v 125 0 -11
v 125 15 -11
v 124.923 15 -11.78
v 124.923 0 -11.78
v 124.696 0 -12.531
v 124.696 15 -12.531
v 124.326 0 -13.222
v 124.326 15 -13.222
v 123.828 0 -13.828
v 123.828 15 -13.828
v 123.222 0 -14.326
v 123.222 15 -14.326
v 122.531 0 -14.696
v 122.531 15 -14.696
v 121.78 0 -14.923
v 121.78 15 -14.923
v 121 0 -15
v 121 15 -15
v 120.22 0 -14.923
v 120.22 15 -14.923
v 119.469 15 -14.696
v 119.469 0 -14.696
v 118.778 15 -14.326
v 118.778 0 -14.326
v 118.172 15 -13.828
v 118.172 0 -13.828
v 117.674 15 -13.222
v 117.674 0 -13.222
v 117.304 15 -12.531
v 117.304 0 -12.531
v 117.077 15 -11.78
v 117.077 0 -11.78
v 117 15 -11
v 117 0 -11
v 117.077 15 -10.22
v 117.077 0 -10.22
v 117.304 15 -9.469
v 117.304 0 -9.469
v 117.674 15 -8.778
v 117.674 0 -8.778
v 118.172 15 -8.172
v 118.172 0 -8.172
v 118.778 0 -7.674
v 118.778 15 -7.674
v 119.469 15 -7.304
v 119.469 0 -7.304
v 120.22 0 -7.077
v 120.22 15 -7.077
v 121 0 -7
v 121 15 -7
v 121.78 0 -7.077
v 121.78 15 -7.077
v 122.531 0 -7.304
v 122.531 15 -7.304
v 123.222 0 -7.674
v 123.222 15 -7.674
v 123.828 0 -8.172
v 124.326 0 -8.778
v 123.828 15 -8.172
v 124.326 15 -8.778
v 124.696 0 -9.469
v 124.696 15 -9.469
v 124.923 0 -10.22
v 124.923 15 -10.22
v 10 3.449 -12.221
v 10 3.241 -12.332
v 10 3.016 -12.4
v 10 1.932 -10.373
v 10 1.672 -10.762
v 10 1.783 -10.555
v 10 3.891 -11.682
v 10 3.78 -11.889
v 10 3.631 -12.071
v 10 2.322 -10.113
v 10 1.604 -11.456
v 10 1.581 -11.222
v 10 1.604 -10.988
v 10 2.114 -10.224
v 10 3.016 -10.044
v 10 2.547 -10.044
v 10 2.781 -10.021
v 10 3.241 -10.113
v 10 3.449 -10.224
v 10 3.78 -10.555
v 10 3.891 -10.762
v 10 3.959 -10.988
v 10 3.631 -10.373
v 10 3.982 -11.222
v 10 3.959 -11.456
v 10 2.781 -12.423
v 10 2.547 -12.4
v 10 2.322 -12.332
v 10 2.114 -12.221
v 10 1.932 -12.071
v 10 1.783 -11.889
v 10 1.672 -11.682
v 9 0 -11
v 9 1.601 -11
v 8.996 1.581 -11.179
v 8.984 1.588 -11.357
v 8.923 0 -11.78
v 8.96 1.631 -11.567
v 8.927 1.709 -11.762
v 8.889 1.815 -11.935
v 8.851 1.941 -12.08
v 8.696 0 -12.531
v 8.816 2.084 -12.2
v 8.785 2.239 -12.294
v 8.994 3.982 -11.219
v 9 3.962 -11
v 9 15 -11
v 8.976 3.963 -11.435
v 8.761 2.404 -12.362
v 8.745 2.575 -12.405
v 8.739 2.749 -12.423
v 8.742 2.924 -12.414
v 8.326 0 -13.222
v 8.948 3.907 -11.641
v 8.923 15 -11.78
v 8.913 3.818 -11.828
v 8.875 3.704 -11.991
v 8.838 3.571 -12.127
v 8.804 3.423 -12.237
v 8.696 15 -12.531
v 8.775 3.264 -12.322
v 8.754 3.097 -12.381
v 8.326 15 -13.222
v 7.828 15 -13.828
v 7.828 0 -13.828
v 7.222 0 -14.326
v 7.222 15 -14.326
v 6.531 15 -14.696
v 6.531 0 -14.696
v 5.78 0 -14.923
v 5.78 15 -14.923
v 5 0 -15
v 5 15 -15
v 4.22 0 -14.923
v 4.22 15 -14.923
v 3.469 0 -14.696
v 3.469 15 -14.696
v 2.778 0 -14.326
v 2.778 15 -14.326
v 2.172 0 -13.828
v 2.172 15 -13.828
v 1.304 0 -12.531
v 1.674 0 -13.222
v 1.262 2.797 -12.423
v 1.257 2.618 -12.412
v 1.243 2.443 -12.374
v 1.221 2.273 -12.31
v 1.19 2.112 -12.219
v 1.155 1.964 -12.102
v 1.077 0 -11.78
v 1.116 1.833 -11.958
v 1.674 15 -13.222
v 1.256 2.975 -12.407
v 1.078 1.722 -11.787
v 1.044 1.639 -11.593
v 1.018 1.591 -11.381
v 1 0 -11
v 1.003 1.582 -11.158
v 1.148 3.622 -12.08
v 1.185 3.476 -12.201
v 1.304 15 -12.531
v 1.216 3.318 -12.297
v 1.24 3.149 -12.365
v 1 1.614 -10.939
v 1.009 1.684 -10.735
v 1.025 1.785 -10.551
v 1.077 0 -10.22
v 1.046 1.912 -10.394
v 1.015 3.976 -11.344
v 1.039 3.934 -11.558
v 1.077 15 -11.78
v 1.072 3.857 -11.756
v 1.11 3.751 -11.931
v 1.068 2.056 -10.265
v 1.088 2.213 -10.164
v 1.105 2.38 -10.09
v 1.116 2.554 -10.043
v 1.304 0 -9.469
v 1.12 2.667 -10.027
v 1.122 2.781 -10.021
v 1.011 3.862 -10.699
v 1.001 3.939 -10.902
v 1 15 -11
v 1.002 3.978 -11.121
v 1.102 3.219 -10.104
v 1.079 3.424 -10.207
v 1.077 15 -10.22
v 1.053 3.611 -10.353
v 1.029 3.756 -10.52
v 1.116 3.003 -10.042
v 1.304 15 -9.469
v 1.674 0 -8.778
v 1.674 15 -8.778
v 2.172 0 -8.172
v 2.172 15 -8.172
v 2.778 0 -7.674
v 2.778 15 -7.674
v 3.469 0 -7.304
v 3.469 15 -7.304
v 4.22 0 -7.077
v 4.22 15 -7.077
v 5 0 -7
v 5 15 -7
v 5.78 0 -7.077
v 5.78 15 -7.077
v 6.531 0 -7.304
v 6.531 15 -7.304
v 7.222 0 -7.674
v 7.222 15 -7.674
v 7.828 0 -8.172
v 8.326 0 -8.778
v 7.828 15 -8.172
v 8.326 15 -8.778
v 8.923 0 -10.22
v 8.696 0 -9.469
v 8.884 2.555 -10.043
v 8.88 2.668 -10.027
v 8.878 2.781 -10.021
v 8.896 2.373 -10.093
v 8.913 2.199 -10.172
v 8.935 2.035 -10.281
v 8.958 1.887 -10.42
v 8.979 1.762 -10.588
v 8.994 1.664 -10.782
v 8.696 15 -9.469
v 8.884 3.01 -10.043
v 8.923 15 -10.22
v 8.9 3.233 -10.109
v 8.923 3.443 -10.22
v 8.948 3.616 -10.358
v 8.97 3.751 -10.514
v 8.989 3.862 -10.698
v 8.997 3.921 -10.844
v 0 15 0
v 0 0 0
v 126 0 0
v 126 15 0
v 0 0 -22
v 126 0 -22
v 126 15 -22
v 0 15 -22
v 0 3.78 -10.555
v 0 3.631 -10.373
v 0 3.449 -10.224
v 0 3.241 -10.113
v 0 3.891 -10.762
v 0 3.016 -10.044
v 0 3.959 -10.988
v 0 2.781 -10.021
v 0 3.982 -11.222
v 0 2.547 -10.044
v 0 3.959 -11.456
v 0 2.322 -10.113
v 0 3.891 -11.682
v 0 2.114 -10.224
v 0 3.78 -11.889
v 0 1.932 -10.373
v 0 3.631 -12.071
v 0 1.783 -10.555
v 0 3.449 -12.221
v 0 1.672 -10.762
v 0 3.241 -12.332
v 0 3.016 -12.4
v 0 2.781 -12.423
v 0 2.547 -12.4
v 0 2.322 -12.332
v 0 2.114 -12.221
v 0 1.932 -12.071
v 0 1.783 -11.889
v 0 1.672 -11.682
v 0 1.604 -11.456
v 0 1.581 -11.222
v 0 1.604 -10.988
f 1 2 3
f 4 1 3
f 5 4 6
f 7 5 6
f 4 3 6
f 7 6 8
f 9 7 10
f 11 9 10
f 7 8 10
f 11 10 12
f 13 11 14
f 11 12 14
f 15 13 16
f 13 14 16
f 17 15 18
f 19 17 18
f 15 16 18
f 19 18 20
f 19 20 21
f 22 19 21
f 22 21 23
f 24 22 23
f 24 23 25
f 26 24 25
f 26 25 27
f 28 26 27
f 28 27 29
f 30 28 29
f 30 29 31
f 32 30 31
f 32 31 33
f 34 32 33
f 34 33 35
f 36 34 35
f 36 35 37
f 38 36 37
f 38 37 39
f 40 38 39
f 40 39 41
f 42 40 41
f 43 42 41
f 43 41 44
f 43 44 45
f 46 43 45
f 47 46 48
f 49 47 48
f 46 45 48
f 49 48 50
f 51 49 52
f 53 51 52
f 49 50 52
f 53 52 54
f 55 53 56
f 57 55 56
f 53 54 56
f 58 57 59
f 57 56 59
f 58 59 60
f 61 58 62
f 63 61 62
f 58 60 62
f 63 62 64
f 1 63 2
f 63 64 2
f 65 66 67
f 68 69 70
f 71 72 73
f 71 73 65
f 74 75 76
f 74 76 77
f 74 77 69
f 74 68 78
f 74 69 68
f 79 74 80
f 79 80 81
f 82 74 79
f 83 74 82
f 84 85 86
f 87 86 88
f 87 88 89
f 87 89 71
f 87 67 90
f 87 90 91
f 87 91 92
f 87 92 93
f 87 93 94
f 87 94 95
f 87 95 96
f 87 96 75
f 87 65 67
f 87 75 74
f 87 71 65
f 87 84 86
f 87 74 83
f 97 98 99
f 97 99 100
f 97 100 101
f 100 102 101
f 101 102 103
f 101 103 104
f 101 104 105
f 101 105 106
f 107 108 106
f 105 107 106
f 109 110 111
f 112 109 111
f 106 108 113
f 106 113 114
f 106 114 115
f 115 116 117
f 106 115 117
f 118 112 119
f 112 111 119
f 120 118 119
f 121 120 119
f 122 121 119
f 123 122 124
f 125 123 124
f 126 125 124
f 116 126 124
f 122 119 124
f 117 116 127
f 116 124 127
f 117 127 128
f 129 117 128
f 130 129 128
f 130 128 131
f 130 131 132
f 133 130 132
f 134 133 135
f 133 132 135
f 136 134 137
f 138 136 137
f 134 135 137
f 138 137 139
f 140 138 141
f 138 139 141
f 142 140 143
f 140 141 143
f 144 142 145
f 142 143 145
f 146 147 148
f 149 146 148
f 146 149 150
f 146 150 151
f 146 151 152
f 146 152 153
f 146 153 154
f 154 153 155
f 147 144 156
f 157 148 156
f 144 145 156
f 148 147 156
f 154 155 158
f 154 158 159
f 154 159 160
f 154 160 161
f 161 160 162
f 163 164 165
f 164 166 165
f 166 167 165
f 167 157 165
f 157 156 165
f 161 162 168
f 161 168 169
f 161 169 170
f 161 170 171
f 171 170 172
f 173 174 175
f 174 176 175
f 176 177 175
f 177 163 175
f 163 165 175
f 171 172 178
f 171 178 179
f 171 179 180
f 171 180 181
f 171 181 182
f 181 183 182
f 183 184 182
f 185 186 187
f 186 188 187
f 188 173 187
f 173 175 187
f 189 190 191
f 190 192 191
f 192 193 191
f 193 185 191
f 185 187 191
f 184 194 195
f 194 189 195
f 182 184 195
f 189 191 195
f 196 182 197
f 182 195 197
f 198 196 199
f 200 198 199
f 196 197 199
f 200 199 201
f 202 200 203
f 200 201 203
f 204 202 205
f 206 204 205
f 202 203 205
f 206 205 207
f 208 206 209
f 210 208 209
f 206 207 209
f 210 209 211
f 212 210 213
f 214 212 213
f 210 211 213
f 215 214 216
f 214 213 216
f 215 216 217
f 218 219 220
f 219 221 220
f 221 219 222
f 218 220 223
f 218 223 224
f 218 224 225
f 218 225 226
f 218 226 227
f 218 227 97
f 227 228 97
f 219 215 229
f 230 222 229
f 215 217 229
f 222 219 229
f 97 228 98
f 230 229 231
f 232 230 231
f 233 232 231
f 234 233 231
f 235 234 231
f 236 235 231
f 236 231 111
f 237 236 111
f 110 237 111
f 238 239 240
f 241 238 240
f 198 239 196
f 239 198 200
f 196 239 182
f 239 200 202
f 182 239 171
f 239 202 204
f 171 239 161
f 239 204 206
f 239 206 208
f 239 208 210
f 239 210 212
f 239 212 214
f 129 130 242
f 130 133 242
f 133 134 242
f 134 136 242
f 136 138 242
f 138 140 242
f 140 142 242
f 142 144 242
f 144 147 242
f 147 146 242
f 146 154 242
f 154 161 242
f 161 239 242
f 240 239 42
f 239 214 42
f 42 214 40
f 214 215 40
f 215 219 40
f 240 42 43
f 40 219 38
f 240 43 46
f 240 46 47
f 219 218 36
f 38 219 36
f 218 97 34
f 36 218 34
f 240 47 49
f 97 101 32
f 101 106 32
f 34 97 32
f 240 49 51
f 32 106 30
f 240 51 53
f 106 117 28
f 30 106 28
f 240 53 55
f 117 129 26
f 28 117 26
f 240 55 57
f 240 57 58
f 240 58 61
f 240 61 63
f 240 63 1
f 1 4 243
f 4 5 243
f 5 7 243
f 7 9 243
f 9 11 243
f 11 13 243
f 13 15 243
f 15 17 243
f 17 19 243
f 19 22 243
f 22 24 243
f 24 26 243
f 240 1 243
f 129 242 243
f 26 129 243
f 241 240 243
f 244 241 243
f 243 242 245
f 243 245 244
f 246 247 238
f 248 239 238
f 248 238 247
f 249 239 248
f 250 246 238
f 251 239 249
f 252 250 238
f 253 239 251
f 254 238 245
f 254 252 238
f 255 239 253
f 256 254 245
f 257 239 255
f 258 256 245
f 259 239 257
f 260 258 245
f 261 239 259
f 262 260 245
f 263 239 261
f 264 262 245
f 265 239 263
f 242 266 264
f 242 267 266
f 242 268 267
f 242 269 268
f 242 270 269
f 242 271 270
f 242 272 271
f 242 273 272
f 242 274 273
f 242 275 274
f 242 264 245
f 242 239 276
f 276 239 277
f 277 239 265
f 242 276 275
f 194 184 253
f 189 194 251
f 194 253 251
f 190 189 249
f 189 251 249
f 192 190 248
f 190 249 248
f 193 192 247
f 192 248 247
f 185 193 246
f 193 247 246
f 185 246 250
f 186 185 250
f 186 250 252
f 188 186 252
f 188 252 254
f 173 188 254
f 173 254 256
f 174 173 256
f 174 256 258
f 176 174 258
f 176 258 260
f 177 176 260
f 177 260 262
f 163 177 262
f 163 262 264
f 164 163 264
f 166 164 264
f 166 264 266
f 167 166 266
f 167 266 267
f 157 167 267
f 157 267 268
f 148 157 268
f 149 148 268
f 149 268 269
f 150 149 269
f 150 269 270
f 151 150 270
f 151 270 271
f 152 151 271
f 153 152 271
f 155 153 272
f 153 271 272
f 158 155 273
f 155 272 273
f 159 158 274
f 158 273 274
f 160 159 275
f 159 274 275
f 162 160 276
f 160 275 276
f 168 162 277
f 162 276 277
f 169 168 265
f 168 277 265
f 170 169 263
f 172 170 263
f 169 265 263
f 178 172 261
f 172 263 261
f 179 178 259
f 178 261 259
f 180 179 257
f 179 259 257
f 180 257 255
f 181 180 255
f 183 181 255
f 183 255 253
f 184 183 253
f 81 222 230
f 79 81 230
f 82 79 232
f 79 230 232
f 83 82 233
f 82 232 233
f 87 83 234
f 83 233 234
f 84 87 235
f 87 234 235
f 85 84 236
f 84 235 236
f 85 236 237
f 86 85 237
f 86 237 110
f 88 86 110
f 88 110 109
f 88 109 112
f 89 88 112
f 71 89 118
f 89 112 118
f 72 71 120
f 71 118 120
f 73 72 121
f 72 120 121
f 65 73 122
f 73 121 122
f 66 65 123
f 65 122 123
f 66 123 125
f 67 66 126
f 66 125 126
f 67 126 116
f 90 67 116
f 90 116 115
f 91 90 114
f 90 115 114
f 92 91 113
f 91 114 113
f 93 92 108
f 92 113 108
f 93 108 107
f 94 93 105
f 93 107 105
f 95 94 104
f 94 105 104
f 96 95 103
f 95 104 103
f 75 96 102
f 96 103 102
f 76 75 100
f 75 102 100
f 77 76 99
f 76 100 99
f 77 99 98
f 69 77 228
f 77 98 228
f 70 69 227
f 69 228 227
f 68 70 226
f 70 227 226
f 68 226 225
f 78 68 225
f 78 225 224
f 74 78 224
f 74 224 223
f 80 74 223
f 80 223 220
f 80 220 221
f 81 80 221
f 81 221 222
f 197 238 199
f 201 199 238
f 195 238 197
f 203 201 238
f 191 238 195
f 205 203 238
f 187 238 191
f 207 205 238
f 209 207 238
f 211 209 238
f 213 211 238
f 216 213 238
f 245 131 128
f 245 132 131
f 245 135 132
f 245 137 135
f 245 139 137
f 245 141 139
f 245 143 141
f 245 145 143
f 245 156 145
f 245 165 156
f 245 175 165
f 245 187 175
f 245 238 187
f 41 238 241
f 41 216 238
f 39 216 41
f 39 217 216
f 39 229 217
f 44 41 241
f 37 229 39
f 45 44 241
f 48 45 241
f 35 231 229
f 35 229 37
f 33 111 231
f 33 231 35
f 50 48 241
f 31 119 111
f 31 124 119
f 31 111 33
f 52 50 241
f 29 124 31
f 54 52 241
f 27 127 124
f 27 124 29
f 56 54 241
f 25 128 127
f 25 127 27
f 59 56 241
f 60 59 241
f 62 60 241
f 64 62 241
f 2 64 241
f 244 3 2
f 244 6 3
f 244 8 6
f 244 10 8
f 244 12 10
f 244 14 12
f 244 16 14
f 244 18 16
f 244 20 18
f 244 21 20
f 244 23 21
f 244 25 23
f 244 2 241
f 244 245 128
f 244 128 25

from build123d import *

# Parameters (mm, degrees)
SKETCH5_W           = 126
SKETCH5_H           = 22
BOSS_EXTRUDE5_DEPTH = 15
SKETCH6_R           = 1.200912212
CUT_EXTRUDE1_DEPTH  = 10
SKETCH7_R           = 4
CUT_EXTRUDE2_DEPTH  = 16


with BuildPart() as part:
    # Sketch5 → Boss-Extrude5 (new body)
    with BuildSketch(Plane(origin=(0, 0, 0), x_dir=(1, 0, 0), z_dir=(0, 1, 0))):
        with Locations((63, 11)):
            Rectangle(SKETCH5_W, SKETCH5_H)
    extrude(amount=BOSS_EXTRUDE5_DEPTH)

    # Sketch6 → Cut-Extrude1 (cut)
    with BuildSketch(Plane.ZY):
        with Locations((-11.222048747, 2.781464134)):
            Circle(SKETCH6_R)
    extrude(amount=-CUT_EXTRUDE1_DEPTH, mode=Mode.SUBTRACT)

    # Sketch7 → Cut-Extrude2 (cut, through all)
    with BuildSketch(Plane(origin=(0, 15, 0), x_dir=(1, 0, 0), z_dir=(0, 1, 0))):
        with Locations((5, 11)):
            Circle(SKETCH7_R)
        with Locations((121, 11)):
            Circle(SKETCH7_R)
    extrude(amount=-CUT_EXTRUDE2_DEPTH, mode=Mode.SUBTRACT)


solid = part.part
